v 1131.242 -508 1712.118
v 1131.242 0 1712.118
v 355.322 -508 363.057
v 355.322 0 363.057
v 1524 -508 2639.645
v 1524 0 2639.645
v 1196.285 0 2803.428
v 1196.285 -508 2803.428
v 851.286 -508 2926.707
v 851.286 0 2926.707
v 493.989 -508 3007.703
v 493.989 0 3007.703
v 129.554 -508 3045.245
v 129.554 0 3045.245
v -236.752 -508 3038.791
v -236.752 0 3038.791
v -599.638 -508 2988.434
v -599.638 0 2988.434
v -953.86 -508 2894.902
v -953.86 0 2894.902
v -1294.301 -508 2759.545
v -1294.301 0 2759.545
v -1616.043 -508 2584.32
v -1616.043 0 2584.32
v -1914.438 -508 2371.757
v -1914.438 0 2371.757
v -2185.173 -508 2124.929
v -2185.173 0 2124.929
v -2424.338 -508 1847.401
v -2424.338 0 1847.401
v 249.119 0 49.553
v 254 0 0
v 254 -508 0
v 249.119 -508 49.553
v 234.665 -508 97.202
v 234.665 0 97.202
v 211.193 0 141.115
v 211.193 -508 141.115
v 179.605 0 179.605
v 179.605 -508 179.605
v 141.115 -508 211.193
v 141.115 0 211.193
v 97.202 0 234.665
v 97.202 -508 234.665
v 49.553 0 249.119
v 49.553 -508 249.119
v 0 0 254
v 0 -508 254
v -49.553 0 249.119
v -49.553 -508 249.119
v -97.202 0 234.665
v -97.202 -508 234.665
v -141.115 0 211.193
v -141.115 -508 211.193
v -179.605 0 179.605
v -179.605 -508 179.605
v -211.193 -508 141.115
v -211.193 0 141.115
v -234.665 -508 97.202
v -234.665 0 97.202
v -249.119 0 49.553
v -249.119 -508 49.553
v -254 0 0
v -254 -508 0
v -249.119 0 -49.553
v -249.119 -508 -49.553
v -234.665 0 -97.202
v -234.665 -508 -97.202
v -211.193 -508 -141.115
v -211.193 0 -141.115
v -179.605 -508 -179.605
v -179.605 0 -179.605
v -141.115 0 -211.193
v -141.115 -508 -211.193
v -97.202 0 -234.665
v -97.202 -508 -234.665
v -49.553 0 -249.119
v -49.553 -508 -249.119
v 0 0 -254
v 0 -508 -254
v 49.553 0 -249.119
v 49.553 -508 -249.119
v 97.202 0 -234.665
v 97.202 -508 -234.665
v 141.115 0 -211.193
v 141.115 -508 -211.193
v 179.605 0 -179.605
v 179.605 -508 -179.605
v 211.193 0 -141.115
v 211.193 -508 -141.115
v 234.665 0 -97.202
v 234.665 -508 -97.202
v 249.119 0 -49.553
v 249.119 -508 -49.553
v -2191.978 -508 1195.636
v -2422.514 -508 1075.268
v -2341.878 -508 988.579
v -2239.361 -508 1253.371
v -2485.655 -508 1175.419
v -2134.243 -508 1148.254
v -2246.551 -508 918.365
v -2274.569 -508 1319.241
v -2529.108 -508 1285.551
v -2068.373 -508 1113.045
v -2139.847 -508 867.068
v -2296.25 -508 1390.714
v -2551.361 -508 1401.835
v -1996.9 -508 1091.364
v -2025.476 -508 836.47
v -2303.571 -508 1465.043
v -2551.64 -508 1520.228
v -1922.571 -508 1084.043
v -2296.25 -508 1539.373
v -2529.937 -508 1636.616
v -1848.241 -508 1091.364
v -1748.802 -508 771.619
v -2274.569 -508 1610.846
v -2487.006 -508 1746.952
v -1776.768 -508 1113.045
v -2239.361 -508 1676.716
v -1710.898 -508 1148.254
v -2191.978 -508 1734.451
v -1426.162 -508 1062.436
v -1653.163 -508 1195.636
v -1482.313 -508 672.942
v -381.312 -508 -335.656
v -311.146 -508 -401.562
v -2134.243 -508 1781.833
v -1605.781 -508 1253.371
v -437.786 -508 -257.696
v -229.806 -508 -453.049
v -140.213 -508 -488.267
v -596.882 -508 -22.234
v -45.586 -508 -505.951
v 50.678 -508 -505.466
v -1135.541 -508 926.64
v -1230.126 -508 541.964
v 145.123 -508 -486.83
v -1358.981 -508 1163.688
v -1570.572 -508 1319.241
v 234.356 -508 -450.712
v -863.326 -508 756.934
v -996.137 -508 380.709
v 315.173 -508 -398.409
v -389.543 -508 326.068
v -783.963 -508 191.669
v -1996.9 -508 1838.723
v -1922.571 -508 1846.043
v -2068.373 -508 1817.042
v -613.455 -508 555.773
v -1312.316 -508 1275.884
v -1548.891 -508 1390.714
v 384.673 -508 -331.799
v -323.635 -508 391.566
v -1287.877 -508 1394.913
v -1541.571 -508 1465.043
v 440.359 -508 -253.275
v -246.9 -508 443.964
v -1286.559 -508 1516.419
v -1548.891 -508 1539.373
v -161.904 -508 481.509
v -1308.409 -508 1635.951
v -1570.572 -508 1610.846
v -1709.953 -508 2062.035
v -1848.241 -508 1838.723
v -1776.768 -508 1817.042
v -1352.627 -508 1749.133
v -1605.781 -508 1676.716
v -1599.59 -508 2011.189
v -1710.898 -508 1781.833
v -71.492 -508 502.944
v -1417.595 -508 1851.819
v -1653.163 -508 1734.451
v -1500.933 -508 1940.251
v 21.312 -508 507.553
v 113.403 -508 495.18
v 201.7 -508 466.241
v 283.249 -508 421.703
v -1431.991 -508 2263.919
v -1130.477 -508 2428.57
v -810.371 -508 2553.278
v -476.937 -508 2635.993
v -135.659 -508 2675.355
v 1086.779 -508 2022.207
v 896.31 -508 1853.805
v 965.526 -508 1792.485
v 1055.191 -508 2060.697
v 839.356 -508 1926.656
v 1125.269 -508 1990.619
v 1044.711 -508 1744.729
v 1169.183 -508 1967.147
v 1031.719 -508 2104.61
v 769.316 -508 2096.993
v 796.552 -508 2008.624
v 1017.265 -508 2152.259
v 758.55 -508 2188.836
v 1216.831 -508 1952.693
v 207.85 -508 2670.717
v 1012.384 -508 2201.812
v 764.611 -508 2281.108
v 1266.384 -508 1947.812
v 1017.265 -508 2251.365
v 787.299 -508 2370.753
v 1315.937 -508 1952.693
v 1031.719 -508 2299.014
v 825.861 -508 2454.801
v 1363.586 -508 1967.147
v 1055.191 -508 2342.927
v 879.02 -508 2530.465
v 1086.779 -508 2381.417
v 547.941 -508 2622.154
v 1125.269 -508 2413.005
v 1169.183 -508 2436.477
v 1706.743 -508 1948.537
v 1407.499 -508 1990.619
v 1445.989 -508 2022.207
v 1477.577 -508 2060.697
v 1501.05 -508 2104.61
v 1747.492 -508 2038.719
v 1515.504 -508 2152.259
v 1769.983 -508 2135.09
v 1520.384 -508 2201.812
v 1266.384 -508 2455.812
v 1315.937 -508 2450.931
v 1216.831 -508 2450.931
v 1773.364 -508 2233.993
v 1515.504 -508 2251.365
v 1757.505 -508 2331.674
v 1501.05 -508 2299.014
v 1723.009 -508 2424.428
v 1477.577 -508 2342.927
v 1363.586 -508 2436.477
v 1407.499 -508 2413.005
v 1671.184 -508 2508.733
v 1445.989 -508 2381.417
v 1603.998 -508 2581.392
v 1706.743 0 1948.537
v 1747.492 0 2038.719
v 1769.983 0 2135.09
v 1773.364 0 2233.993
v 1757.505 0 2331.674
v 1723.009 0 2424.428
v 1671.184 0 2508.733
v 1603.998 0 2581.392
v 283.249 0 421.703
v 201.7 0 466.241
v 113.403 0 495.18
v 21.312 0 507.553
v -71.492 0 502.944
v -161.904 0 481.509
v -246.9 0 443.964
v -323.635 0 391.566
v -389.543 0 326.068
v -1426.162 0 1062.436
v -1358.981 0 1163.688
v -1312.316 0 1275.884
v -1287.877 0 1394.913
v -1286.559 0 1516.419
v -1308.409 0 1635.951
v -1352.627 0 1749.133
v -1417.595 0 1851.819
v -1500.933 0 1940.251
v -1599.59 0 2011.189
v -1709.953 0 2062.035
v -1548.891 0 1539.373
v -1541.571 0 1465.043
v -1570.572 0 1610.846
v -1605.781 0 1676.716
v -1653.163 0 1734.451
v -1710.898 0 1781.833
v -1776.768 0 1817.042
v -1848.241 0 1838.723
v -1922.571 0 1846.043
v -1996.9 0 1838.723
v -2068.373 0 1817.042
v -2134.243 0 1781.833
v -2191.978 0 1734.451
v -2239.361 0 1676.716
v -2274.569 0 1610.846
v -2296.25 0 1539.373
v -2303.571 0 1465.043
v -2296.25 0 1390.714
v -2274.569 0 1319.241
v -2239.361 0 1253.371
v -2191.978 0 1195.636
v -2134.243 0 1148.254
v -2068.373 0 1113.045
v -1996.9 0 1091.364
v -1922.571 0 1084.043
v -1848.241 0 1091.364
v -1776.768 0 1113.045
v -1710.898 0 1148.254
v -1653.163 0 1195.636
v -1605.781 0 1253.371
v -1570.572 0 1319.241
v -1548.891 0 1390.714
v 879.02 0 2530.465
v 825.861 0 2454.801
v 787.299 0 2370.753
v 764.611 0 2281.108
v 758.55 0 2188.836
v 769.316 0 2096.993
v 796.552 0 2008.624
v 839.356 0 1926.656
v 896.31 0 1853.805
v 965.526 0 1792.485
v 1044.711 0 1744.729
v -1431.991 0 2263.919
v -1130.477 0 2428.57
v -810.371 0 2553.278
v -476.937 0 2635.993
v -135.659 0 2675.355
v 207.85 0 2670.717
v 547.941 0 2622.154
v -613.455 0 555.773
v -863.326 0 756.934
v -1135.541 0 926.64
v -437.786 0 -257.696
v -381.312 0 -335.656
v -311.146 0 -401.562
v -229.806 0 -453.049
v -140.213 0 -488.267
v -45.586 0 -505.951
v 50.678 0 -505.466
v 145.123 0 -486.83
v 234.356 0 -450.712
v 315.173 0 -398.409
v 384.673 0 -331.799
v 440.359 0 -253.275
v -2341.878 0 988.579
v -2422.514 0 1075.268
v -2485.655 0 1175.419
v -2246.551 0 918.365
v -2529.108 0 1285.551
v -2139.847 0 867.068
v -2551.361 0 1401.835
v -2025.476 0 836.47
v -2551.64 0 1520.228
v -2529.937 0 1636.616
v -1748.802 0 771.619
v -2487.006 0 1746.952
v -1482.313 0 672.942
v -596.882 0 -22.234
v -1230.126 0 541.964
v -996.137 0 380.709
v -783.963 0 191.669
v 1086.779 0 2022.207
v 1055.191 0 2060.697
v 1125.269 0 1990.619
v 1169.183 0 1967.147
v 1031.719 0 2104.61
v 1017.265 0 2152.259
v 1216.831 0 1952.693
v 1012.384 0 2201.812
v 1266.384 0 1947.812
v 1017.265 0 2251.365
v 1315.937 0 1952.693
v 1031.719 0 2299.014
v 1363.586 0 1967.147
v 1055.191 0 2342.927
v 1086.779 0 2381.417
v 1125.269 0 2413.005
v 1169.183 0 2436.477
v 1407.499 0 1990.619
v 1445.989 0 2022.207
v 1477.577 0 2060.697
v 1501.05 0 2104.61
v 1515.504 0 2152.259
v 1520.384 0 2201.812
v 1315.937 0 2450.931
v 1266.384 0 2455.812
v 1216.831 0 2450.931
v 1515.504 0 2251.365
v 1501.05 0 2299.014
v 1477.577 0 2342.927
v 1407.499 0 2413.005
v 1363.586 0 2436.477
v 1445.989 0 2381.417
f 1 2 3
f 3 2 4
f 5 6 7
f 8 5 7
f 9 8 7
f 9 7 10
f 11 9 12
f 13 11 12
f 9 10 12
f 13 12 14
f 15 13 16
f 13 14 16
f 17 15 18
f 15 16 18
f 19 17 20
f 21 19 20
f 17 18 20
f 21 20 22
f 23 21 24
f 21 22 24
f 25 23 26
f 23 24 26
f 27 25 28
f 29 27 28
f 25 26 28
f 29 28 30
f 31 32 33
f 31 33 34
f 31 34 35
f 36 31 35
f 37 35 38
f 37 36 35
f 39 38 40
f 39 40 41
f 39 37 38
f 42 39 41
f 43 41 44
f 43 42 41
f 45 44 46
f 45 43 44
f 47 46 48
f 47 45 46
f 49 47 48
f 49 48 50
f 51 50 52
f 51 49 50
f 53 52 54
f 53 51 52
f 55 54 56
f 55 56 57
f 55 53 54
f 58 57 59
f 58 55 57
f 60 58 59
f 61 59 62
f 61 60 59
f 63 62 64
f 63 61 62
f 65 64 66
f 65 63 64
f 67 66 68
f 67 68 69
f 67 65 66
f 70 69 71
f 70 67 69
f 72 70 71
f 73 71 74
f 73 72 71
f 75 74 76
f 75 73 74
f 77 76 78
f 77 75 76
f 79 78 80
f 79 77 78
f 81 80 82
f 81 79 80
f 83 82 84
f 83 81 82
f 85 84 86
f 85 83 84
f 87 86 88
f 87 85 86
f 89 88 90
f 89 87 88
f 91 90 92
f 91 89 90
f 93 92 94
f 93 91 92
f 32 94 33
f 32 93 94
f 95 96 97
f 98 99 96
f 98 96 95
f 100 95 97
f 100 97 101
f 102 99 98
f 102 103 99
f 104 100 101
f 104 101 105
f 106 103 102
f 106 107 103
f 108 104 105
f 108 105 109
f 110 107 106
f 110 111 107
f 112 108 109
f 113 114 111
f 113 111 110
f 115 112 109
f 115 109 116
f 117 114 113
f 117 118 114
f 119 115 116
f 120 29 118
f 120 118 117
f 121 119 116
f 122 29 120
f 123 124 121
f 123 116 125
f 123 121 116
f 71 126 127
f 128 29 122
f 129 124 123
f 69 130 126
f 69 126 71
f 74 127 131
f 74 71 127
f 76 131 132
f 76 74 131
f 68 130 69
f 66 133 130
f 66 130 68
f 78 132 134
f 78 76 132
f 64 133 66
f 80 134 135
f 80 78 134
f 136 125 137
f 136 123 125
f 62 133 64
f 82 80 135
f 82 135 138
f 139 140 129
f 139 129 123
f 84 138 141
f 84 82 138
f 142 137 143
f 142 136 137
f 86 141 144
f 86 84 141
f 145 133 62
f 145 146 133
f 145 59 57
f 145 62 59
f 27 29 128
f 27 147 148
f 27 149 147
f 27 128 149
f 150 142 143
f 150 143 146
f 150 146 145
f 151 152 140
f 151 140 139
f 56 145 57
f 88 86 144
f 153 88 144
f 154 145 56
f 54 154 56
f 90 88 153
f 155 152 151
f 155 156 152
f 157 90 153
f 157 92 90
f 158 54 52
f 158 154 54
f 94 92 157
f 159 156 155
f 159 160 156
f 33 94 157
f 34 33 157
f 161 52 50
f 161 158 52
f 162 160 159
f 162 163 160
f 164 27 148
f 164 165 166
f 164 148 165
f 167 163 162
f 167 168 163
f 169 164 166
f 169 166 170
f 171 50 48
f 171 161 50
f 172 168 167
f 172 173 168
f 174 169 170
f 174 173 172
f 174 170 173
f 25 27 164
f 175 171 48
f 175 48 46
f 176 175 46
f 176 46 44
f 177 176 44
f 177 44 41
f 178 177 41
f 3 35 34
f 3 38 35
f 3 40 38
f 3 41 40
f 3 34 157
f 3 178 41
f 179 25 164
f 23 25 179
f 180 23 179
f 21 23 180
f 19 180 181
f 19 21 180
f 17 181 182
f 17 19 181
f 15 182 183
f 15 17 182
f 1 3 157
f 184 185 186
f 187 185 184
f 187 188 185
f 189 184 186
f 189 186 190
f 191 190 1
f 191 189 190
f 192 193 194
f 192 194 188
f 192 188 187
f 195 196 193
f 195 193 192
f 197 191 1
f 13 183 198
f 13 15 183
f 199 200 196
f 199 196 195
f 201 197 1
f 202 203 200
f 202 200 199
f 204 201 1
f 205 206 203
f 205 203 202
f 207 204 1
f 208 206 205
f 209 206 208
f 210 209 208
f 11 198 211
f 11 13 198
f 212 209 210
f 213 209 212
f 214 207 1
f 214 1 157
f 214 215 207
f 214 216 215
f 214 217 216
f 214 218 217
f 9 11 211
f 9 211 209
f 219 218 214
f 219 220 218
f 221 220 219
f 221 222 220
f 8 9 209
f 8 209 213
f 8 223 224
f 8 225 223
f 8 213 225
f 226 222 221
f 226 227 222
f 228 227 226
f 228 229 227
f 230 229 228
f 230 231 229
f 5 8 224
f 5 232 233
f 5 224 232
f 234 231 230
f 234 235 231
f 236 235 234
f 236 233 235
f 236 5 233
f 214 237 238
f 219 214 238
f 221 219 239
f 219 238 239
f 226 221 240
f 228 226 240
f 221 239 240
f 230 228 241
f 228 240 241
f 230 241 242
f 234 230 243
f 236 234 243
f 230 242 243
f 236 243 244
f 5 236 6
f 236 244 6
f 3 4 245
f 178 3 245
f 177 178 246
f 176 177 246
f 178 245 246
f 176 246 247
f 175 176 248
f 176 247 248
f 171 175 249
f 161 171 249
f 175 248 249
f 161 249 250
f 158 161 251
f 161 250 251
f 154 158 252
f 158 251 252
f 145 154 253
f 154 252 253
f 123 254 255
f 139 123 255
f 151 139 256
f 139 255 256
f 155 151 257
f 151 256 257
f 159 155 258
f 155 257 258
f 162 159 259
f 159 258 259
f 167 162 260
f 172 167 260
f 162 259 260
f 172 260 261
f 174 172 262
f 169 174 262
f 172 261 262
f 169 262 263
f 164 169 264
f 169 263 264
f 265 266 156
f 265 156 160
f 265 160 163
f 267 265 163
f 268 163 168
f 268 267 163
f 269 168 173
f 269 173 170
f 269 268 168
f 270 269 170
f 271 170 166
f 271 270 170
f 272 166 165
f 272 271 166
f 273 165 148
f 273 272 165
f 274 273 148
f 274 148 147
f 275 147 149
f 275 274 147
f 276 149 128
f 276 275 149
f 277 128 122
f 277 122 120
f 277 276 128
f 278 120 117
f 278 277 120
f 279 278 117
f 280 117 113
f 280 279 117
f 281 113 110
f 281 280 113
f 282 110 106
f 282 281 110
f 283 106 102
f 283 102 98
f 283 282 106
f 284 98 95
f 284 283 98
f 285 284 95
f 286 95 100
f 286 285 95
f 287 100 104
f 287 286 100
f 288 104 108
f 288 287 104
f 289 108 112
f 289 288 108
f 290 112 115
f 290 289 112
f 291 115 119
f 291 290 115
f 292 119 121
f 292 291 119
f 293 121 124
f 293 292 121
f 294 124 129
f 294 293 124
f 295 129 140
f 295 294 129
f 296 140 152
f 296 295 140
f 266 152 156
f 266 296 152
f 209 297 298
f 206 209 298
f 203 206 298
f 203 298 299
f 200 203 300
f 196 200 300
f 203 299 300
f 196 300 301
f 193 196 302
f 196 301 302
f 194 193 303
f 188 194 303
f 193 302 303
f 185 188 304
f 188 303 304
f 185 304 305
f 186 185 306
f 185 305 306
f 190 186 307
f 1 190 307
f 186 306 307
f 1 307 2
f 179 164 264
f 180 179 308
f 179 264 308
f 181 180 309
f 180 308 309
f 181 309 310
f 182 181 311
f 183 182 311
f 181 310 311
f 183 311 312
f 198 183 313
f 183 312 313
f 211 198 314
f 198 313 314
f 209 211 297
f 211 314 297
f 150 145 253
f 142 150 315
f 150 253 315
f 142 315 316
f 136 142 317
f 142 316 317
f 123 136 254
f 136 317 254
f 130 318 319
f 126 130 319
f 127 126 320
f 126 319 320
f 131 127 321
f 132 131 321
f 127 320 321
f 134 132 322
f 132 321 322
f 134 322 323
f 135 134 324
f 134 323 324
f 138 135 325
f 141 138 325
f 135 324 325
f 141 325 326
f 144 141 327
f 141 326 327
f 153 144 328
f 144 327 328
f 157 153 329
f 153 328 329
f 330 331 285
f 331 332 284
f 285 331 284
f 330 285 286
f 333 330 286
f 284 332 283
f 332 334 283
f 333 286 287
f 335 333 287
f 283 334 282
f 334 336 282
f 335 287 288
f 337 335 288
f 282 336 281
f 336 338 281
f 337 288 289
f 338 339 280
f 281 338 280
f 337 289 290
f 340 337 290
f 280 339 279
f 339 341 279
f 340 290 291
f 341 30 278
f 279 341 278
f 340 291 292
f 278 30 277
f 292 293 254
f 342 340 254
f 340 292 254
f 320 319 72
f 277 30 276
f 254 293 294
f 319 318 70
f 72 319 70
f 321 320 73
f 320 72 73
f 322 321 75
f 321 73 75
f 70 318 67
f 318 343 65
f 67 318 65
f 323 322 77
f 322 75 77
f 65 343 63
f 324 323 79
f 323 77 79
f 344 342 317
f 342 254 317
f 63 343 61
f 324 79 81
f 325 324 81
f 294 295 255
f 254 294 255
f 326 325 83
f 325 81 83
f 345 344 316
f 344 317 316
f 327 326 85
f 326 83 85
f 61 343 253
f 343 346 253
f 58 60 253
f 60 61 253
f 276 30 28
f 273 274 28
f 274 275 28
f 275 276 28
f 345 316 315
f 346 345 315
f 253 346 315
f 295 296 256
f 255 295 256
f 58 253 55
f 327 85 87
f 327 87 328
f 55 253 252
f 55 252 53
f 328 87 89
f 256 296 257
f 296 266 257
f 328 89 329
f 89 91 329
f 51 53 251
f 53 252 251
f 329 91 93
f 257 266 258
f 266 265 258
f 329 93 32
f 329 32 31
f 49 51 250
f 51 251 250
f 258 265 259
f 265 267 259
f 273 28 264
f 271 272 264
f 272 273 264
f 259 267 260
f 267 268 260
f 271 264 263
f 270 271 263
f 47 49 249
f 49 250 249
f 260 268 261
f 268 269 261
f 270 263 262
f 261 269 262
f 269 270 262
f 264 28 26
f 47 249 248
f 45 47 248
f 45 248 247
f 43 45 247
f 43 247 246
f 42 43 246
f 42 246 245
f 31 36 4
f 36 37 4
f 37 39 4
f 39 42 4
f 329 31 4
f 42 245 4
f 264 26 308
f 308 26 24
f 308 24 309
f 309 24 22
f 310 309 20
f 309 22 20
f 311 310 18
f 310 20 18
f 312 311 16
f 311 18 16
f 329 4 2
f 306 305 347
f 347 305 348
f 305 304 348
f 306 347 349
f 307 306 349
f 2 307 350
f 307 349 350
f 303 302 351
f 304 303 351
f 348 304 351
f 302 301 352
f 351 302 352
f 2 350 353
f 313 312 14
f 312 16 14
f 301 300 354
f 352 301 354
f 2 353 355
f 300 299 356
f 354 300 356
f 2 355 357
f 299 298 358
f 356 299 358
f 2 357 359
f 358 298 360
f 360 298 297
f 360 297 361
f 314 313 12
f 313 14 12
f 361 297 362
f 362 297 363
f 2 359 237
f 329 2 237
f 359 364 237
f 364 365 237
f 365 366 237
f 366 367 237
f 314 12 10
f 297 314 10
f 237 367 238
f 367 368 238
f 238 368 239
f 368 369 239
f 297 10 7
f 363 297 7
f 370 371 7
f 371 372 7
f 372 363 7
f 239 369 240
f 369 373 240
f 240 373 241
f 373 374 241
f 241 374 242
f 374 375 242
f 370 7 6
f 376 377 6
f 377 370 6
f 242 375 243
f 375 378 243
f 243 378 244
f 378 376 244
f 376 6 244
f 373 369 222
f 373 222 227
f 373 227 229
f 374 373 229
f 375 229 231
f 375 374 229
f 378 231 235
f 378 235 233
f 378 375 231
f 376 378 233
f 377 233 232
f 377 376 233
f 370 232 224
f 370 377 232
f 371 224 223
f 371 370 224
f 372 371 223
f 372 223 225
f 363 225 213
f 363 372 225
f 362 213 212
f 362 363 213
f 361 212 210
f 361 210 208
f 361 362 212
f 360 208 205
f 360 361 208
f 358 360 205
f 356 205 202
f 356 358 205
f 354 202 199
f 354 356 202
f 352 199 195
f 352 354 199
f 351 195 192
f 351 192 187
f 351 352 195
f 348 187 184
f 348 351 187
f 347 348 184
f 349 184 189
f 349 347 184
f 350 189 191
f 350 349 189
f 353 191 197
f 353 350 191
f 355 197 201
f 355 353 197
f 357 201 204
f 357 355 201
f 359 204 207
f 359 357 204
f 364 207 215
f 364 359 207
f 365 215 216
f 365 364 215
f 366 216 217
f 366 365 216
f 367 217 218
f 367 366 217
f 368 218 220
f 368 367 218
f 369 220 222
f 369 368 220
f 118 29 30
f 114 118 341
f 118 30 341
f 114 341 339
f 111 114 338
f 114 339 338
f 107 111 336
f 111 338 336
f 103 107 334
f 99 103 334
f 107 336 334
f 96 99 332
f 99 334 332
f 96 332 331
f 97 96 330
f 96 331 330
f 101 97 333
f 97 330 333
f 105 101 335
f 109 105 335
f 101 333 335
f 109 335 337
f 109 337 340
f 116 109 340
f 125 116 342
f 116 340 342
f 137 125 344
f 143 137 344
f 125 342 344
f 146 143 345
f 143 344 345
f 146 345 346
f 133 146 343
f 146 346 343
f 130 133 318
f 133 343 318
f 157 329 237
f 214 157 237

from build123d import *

# Parameters (mm, degrees)
F0_R     = 254
F0_R_2   = 381
F1_DEPTH = 508


with BuildPart() as f1:
    # F0 (on Front) → F1 (new body)
    with BuildSketch(Plane.XZ):
        with BuildLine():
            ThreePointArc((1706.742988, 1948.537264), (1757.505109, 2331.674352), (1524, 2639.645431))
            ThreePointArc((1524, 2639.645431), (-599.637522, 2988.434179), (-2424.338094, 1847.400554))
            ThreePointArc((-2424.338094, 1847.400554), (-2509.953916, 1229.470198), (-2025.475657, 836.47044))
            ThreePointArc((-2025.475657, 836.47044), (-1110.623183, 464.975519), (-437.786265, -257.695919))
            ThreePointArc((-437.786265, -257.695919), (2.557567, -507.993562), (440.35882, -253.274771))
            Line((440.35882, -253.274771), (1706.742988, 1948.537264))
        make_face()
        Circle(F0_R, mode=Mode.SUBTRACT)
        with Locations((-1922.570594, 1465.043468)):
            Circle(F0_R_2, mode=Mode.SUBTRACT)
        with BuildLine():
            ThreePointArc((-1709.952806, 2062.035482), (-476.937108, 2635.993157), (879.019726, 2530.465026))
            ThreePointArc((879.019726, 2530.465026), (780.918975, 2052.187347), (1131.241631, 1712.117747))
            Line((1131.241631, 1712.117747), (355.321947, 363.056902))
            ThreePointArc((355.321947, 363.056902), (-25.19545, 507.374802), (-389.54283, 326.068065))
            ThreePointArc((-389.54283, 326.068065), (-863.325848, 756.933942), (-1426.16174, 1062.436006))
            ThreePointArc((-1426.16174, 1062.436006), (-1308.408826, 1635.951179), (-1709.952806, 2062.035482))
        make_face(mode=Mode.SUBTRACT)
        with Locations((1266.384168, 2201.812034)):
            Circle(F0_R, mode=Mode.SUBTRACT)
    extrude(amount=F1_DEPTH)


solid = f1.part
